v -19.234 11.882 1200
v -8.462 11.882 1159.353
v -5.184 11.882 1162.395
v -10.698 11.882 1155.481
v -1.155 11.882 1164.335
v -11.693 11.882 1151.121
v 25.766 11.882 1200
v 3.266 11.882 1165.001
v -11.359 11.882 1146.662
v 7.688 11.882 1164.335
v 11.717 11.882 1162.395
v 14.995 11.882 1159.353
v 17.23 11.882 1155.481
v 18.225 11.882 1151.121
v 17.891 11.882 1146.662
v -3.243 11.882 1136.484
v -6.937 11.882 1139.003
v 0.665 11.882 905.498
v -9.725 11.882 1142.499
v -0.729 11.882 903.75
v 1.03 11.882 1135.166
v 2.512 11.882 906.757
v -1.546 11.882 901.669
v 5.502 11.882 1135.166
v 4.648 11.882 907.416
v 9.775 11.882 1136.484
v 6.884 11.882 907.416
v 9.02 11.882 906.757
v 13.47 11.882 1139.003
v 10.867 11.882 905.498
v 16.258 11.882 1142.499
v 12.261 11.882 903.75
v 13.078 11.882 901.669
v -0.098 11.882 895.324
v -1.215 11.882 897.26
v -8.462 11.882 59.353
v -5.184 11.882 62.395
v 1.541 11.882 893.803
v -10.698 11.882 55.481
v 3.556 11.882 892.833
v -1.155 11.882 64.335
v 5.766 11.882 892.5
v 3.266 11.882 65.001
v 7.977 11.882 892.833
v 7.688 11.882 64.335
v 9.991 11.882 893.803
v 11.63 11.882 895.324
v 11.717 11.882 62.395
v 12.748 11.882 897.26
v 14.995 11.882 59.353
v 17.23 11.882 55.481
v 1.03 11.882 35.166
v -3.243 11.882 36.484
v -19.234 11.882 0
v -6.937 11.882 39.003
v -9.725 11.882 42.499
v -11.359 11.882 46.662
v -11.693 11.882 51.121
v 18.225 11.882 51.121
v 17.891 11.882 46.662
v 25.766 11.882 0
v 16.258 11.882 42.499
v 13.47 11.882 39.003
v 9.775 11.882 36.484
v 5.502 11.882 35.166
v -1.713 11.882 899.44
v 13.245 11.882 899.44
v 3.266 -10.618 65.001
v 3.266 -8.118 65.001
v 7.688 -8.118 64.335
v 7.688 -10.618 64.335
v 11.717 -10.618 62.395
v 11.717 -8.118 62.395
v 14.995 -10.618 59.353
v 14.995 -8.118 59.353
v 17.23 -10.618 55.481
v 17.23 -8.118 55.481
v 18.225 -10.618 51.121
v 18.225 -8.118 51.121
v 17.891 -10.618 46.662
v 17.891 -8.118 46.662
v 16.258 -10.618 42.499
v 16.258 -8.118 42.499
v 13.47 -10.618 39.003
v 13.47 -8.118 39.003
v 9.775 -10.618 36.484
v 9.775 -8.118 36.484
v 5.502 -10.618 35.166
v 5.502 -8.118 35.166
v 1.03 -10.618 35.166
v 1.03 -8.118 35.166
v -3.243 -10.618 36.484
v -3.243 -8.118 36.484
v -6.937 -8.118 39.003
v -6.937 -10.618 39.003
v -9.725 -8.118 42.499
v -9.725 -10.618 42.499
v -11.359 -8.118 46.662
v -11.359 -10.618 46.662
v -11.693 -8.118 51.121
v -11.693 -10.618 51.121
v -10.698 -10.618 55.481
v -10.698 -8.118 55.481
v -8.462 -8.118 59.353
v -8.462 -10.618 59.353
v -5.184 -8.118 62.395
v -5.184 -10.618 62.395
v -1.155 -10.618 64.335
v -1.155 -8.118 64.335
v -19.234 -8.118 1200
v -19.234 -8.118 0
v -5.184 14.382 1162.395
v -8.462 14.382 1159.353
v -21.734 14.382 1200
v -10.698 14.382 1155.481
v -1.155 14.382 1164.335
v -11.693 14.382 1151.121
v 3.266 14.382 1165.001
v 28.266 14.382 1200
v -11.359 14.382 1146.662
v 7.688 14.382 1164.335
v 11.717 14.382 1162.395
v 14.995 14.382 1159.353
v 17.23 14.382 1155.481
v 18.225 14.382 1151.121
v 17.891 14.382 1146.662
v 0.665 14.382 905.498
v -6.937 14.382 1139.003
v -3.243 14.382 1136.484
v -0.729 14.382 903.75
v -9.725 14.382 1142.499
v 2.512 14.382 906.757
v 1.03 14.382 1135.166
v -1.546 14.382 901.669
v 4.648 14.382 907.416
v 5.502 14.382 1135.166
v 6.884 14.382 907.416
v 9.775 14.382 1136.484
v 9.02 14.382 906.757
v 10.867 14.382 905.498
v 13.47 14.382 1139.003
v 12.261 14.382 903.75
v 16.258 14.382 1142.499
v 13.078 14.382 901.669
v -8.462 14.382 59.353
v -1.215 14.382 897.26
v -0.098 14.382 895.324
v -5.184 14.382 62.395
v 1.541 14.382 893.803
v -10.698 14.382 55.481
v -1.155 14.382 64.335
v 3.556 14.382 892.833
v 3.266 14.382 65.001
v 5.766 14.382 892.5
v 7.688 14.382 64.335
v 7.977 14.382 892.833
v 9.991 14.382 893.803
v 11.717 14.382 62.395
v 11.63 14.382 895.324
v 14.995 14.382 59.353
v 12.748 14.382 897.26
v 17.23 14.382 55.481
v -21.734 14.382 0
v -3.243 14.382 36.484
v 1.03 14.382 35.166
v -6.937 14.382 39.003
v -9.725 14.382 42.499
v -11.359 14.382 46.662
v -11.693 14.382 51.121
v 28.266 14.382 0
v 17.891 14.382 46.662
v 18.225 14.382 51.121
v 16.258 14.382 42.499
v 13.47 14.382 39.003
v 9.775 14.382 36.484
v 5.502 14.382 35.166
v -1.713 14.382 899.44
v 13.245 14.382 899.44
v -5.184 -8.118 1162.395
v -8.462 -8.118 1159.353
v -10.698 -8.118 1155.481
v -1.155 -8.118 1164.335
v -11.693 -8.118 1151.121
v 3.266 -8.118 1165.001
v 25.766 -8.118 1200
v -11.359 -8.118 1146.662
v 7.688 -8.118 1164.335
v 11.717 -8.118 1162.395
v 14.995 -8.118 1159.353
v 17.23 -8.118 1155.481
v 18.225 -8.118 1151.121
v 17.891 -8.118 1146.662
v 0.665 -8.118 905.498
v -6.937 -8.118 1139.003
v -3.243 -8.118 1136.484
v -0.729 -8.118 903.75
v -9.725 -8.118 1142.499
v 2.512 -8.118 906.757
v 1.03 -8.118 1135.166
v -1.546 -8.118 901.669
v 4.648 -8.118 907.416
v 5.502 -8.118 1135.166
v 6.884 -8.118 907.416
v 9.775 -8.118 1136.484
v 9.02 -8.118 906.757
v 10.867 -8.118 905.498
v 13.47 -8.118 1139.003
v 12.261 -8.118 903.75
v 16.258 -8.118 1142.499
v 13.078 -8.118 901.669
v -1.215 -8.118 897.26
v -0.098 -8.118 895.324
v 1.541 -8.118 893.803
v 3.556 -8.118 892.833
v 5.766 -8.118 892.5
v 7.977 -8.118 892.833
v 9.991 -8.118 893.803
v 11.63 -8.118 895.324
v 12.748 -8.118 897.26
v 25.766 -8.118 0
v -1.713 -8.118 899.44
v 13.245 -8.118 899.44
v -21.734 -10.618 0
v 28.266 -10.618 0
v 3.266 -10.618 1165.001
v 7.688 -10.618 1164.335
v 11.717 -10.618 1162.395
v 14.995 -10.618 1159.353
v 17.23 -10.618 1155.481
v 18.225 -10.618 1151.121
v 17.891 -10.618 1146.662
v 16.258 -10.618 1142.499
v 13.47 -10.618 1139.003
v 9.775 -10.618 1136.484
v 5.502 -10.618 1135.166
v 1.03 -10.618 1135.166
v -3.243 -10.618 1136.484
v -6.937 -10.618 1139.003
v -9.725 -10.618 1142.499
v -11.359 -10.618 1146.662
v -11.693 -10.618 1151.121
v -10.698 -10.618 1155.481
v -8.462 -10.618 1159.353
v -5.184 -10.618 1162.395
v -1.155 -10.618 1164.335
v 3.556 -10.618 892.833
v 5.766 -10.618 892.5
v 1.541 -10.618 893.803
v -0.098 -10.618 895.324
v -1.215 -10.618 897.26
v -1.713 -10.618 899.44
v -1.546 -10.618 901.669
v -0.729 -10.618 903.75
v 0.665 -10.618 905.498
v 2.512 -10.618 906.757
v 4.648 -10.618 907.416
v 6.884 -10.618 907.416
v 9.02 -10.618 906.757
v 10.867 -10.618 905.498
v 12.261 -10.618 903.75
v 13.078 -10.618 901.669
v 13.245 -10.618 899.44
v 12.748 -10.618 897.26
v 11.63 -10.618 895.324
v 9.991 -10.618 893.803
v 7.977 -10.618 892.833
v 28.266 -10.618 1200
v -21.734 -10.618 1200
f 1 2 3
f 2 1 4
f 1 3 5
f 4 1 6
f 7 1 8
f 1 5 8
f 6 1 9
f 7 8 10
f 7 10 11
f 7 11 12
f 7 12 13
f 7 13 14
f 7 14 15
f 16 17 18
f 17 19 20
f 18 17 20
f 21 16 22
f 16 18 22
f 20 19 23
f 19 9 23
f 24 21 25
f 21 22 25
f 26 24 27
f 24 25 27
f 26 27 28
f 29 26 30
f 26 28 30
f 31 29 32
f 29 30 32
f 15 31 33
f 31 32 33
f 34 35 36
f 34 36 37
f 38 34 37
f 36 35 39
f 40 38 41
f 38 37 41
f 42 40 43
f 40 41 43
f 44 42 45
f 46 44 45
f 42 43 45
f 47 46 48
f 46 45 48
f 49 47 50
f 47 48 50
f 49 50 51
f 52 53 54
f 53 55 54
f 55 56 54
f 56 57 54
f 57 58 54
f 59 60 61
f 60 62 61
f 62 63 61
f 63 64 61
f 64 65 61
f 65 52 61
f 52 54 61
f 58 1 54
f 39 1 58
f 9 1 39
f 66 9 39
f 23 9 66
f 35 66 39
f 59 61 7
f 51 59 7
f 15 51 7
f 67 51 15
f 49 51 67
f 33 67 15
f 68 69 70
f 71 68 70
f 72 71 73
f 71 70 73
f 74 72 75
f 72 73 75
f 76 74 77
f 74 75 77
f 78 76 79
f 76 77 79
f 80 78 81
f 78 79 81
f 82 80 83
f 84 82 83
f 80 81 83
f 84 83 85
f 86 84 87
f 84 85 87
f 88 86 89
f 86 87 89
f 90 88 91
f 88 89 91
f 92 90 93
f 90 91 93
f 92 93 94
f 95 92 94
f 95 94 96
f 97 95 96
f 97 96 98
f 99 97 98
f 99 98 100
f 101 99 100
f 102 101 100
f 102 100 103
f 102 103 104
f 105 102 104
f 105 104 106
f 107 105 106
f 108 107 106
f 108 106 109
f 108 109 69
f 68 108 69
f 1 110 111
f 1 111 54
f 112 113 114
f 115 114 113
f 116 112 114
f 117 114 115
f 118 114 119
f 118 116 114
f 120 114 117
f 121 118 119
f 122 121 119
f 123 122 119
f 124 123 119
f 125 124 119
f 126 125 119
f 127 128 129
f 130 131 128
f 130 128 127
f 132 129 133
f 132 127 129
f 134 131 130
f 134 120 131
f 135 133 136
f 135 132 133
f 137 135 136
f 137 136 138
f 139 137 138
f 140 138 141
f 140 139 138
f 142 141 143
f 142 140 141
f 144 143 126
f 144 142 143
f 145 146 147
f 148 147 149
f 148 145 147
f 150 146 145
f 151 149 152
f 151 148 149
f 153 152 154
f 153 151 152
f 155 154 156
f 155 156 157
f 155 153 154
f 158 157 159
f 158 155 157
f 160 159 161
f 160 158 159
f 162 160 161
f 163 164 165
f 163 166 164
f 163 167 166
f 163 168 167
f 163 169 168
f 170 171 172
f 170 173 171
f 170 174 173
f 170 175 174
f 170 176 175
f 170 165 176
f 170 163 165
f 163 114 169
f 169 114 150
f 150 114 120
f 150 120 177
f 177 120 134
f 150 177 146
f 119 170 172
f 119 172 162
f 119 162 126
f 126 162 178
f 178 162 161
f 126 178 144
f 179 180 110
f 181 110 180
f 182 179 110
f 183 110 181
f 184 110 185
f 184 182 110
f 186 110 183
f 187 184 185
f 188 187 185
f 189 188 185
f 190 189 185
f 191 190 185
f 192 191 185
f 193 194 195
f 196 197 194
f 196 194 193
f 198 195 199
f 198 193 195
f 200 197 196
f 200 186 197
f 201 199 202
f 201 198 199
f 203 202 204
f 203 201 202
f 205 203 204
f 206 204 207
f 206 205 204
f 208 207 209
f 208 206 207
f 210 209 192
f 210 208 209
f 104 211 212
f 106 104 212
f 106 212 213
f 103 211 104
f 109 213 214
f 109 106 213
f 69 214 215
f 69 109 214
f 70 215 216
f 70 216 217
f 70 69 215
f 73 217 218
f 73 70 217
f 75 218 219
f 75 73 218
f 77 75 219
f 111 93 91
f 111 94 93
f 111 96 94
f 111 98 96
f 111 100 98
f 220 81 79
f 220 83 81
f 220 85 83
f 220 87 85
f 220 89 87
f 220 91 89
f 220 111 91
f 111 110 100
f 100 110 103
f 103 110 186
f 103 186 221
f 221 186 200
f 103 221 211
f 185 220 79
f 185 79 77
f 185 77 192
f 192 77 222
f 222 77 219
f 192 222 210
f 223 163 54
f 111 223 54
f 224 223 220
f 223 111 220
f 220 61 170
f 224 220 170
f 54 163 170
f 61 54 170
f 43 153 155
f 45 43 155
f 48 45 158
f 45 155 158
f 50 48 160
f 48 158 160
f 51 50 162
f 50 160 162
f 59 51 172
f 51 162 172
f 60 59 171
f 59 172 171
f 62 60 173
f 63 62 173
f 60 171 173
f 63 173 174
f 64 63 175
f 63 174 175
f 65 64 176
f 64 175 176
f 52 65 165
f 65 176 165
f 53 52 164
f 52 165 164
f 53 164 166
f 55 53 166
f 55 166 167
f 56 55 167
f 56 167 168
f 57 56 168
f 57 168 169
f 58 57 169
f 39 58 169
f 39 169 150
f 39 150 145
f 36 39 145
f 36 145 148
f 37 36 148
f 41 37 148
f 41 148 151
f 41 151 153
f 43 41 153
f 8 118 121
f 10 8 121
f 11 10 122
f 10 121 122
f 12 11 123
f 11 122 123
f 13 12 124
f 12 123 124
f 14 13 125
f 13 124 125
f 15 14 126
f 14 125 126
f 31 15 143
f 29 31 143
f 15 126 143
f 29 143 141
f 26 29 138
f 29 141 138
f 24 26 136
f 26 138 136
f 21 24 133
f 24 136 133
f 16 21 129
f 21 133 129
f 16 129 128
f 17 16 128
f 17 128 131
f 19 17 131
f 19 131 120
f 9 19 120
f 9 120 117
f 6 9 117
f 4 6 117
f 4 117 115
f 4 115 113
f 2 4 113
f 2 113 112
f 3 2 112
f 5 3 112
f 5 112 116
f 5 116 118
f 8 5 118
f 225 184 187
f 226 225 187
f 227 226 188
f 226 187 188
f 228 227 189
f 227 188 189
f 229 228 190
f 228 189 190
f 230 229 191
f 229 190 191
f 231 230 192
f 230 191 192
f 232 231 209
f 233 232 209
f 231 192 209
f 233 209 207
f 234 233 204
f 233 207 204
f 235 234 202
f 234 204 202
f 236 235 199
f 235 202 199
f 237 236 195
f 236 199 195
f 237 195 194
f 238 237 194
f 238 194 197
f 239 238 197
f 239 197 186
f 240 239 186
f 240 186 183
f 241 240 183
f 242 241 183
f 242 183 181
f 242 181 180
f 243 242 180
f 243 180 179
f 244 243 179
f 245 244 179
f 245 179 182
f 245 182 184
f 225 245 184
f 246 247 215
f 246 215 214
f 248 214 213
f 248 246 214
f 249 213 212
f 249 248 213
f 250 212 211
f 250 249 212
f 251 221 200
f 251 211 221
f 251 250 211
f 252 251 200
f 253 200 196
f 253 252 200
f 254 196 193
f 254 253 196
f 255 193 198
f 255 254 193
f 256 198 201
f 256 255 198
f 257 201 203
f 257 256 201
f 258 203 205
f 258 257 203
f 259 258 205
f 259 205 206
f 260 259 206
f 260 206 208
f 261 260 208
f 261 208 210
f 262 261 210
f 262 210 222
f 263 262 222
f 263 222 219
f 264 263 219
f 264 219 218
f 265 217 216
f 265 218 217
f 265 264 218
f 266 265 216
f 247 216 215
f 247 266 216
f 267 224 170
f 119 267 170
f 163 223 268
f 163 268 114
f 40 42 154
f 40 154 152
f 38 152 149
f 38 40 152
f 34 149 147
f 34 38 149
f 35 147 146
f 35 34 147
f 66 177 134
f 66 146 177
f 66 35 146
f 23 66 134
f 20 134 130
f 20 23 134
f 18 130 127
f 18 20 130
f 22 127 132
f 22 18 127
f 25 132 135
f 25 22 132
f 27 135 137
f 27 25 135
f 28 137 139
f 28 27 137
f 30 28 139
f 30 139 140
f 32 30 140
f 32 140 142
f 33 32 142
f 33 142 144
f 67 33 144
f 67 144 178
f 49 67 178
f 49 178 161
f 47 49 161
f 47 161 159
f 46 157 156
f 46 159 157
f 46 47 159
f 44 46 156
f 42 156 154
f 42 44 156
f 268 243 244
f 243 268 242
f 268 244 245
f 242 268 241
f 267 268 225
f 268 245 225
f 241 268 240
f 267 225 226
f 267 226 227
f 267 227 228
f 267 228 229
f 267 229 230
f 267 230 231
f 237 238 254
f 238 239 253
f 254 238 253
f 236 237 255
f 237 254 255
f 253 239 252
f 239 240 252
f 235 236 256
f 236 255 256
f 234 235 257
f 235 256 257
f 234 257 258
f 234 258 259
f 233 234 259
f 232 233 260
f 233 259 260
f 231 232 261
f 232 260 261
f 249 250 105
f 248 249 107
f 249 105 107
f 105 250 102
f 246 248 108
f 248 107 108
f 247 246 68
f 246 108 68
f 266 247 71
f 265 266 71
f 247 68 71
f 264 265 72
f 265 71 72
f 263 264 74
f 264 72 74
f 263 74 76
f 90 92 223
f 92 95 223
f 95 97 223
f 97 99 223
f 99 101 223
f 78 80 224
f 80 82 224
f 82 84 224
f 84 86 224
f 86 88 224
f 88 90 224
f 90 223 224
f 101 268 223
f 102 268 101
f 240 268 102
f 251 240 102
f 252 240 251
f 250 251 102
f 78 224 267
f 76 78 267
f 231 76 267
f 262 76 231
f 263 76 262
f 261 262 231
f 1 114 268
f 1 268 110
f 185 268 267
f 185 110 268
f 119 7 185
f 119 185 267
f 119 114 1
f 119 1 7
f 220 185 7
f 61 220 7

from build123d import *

# Parameters (mm, degrees)
SKETCH1_W               = 50
SKETCH1_H               = 25
BOSS_EXTRUDE1_DEPTH     = 1200
SHELL1_T                = -2.5
CUT_EXTRUDE1_DEPTH      = 1201.419015069
CUT_EXTRUDE1_DEPTH_BACK = 1201.419015069
SKETCH2_R               = 7.5
SKETCH3_R               = 15.00115
CUT_EXTRUDE2_DEPTH      = 1201.593177499


with BuildPart() as part:
    # Sketch1 → Boss-Extrude1 (new body)
    with BuildSketch(Plane.XY):
        with Locations((3.266196349, 1.88172043)):
            Rectangle(SKETCH1_W, SKETCH1_H)
    extrude(amount=BOSS_EXTRUDE1_DEPTH)

    # Shell1
    shell1_openings = [part.faces().sort_by_distance(p)[0] for p in [
        (3.266196349, 1.88172043, 1200),
        (3.266196349, 1.88172043, 0),
    ]]
    offset(amount=SHELL1_T, openings=shell1_openings, kind=Kind.INTERSECTION)

    # Sketch2 → Cut-Extrude1 (cut, two sides: drawn at the far end of the back side and taken through both)
    with BuildSketch(Plane(origin=(0, 0, 0), x_dir=(1, 0, 0), z_dir=(0, 1, 0)).offset(-CUT_EXTRUDE1_DEPTH_BACK)):
        with Locations(Location((5.766196349, -900, 0), (0, 0, 90))):
            Circle(SKETCH2_R)
    extrude(amount=CUT_EXTRUDE1_DEPTH + CUT_EXTRUDE1_DEPTH_BACK, mode=Mode.SUBTRACT)

    # Sketch3 → Cut-Extrude2 (cut, through all)
    with BuildSketch(Plane(origin=(0, 14.38172043, 0), x_dir=(1, 0, 0), z_dir=(0, 1, 0))):
        with Locations(Location((3.266196349, -50, 0), (0, 0, 270))):
            Circle(SKETCH3_R)
        with Locations(Location((3.266196349, -1150, 0), (0, 0, 270))):
            Circle(SKETCH3_R)
    extrude(amount=-CUT_EXTRUDE2_DEPTH, mode=Mode.SUBTRACT)


solid = part.part
